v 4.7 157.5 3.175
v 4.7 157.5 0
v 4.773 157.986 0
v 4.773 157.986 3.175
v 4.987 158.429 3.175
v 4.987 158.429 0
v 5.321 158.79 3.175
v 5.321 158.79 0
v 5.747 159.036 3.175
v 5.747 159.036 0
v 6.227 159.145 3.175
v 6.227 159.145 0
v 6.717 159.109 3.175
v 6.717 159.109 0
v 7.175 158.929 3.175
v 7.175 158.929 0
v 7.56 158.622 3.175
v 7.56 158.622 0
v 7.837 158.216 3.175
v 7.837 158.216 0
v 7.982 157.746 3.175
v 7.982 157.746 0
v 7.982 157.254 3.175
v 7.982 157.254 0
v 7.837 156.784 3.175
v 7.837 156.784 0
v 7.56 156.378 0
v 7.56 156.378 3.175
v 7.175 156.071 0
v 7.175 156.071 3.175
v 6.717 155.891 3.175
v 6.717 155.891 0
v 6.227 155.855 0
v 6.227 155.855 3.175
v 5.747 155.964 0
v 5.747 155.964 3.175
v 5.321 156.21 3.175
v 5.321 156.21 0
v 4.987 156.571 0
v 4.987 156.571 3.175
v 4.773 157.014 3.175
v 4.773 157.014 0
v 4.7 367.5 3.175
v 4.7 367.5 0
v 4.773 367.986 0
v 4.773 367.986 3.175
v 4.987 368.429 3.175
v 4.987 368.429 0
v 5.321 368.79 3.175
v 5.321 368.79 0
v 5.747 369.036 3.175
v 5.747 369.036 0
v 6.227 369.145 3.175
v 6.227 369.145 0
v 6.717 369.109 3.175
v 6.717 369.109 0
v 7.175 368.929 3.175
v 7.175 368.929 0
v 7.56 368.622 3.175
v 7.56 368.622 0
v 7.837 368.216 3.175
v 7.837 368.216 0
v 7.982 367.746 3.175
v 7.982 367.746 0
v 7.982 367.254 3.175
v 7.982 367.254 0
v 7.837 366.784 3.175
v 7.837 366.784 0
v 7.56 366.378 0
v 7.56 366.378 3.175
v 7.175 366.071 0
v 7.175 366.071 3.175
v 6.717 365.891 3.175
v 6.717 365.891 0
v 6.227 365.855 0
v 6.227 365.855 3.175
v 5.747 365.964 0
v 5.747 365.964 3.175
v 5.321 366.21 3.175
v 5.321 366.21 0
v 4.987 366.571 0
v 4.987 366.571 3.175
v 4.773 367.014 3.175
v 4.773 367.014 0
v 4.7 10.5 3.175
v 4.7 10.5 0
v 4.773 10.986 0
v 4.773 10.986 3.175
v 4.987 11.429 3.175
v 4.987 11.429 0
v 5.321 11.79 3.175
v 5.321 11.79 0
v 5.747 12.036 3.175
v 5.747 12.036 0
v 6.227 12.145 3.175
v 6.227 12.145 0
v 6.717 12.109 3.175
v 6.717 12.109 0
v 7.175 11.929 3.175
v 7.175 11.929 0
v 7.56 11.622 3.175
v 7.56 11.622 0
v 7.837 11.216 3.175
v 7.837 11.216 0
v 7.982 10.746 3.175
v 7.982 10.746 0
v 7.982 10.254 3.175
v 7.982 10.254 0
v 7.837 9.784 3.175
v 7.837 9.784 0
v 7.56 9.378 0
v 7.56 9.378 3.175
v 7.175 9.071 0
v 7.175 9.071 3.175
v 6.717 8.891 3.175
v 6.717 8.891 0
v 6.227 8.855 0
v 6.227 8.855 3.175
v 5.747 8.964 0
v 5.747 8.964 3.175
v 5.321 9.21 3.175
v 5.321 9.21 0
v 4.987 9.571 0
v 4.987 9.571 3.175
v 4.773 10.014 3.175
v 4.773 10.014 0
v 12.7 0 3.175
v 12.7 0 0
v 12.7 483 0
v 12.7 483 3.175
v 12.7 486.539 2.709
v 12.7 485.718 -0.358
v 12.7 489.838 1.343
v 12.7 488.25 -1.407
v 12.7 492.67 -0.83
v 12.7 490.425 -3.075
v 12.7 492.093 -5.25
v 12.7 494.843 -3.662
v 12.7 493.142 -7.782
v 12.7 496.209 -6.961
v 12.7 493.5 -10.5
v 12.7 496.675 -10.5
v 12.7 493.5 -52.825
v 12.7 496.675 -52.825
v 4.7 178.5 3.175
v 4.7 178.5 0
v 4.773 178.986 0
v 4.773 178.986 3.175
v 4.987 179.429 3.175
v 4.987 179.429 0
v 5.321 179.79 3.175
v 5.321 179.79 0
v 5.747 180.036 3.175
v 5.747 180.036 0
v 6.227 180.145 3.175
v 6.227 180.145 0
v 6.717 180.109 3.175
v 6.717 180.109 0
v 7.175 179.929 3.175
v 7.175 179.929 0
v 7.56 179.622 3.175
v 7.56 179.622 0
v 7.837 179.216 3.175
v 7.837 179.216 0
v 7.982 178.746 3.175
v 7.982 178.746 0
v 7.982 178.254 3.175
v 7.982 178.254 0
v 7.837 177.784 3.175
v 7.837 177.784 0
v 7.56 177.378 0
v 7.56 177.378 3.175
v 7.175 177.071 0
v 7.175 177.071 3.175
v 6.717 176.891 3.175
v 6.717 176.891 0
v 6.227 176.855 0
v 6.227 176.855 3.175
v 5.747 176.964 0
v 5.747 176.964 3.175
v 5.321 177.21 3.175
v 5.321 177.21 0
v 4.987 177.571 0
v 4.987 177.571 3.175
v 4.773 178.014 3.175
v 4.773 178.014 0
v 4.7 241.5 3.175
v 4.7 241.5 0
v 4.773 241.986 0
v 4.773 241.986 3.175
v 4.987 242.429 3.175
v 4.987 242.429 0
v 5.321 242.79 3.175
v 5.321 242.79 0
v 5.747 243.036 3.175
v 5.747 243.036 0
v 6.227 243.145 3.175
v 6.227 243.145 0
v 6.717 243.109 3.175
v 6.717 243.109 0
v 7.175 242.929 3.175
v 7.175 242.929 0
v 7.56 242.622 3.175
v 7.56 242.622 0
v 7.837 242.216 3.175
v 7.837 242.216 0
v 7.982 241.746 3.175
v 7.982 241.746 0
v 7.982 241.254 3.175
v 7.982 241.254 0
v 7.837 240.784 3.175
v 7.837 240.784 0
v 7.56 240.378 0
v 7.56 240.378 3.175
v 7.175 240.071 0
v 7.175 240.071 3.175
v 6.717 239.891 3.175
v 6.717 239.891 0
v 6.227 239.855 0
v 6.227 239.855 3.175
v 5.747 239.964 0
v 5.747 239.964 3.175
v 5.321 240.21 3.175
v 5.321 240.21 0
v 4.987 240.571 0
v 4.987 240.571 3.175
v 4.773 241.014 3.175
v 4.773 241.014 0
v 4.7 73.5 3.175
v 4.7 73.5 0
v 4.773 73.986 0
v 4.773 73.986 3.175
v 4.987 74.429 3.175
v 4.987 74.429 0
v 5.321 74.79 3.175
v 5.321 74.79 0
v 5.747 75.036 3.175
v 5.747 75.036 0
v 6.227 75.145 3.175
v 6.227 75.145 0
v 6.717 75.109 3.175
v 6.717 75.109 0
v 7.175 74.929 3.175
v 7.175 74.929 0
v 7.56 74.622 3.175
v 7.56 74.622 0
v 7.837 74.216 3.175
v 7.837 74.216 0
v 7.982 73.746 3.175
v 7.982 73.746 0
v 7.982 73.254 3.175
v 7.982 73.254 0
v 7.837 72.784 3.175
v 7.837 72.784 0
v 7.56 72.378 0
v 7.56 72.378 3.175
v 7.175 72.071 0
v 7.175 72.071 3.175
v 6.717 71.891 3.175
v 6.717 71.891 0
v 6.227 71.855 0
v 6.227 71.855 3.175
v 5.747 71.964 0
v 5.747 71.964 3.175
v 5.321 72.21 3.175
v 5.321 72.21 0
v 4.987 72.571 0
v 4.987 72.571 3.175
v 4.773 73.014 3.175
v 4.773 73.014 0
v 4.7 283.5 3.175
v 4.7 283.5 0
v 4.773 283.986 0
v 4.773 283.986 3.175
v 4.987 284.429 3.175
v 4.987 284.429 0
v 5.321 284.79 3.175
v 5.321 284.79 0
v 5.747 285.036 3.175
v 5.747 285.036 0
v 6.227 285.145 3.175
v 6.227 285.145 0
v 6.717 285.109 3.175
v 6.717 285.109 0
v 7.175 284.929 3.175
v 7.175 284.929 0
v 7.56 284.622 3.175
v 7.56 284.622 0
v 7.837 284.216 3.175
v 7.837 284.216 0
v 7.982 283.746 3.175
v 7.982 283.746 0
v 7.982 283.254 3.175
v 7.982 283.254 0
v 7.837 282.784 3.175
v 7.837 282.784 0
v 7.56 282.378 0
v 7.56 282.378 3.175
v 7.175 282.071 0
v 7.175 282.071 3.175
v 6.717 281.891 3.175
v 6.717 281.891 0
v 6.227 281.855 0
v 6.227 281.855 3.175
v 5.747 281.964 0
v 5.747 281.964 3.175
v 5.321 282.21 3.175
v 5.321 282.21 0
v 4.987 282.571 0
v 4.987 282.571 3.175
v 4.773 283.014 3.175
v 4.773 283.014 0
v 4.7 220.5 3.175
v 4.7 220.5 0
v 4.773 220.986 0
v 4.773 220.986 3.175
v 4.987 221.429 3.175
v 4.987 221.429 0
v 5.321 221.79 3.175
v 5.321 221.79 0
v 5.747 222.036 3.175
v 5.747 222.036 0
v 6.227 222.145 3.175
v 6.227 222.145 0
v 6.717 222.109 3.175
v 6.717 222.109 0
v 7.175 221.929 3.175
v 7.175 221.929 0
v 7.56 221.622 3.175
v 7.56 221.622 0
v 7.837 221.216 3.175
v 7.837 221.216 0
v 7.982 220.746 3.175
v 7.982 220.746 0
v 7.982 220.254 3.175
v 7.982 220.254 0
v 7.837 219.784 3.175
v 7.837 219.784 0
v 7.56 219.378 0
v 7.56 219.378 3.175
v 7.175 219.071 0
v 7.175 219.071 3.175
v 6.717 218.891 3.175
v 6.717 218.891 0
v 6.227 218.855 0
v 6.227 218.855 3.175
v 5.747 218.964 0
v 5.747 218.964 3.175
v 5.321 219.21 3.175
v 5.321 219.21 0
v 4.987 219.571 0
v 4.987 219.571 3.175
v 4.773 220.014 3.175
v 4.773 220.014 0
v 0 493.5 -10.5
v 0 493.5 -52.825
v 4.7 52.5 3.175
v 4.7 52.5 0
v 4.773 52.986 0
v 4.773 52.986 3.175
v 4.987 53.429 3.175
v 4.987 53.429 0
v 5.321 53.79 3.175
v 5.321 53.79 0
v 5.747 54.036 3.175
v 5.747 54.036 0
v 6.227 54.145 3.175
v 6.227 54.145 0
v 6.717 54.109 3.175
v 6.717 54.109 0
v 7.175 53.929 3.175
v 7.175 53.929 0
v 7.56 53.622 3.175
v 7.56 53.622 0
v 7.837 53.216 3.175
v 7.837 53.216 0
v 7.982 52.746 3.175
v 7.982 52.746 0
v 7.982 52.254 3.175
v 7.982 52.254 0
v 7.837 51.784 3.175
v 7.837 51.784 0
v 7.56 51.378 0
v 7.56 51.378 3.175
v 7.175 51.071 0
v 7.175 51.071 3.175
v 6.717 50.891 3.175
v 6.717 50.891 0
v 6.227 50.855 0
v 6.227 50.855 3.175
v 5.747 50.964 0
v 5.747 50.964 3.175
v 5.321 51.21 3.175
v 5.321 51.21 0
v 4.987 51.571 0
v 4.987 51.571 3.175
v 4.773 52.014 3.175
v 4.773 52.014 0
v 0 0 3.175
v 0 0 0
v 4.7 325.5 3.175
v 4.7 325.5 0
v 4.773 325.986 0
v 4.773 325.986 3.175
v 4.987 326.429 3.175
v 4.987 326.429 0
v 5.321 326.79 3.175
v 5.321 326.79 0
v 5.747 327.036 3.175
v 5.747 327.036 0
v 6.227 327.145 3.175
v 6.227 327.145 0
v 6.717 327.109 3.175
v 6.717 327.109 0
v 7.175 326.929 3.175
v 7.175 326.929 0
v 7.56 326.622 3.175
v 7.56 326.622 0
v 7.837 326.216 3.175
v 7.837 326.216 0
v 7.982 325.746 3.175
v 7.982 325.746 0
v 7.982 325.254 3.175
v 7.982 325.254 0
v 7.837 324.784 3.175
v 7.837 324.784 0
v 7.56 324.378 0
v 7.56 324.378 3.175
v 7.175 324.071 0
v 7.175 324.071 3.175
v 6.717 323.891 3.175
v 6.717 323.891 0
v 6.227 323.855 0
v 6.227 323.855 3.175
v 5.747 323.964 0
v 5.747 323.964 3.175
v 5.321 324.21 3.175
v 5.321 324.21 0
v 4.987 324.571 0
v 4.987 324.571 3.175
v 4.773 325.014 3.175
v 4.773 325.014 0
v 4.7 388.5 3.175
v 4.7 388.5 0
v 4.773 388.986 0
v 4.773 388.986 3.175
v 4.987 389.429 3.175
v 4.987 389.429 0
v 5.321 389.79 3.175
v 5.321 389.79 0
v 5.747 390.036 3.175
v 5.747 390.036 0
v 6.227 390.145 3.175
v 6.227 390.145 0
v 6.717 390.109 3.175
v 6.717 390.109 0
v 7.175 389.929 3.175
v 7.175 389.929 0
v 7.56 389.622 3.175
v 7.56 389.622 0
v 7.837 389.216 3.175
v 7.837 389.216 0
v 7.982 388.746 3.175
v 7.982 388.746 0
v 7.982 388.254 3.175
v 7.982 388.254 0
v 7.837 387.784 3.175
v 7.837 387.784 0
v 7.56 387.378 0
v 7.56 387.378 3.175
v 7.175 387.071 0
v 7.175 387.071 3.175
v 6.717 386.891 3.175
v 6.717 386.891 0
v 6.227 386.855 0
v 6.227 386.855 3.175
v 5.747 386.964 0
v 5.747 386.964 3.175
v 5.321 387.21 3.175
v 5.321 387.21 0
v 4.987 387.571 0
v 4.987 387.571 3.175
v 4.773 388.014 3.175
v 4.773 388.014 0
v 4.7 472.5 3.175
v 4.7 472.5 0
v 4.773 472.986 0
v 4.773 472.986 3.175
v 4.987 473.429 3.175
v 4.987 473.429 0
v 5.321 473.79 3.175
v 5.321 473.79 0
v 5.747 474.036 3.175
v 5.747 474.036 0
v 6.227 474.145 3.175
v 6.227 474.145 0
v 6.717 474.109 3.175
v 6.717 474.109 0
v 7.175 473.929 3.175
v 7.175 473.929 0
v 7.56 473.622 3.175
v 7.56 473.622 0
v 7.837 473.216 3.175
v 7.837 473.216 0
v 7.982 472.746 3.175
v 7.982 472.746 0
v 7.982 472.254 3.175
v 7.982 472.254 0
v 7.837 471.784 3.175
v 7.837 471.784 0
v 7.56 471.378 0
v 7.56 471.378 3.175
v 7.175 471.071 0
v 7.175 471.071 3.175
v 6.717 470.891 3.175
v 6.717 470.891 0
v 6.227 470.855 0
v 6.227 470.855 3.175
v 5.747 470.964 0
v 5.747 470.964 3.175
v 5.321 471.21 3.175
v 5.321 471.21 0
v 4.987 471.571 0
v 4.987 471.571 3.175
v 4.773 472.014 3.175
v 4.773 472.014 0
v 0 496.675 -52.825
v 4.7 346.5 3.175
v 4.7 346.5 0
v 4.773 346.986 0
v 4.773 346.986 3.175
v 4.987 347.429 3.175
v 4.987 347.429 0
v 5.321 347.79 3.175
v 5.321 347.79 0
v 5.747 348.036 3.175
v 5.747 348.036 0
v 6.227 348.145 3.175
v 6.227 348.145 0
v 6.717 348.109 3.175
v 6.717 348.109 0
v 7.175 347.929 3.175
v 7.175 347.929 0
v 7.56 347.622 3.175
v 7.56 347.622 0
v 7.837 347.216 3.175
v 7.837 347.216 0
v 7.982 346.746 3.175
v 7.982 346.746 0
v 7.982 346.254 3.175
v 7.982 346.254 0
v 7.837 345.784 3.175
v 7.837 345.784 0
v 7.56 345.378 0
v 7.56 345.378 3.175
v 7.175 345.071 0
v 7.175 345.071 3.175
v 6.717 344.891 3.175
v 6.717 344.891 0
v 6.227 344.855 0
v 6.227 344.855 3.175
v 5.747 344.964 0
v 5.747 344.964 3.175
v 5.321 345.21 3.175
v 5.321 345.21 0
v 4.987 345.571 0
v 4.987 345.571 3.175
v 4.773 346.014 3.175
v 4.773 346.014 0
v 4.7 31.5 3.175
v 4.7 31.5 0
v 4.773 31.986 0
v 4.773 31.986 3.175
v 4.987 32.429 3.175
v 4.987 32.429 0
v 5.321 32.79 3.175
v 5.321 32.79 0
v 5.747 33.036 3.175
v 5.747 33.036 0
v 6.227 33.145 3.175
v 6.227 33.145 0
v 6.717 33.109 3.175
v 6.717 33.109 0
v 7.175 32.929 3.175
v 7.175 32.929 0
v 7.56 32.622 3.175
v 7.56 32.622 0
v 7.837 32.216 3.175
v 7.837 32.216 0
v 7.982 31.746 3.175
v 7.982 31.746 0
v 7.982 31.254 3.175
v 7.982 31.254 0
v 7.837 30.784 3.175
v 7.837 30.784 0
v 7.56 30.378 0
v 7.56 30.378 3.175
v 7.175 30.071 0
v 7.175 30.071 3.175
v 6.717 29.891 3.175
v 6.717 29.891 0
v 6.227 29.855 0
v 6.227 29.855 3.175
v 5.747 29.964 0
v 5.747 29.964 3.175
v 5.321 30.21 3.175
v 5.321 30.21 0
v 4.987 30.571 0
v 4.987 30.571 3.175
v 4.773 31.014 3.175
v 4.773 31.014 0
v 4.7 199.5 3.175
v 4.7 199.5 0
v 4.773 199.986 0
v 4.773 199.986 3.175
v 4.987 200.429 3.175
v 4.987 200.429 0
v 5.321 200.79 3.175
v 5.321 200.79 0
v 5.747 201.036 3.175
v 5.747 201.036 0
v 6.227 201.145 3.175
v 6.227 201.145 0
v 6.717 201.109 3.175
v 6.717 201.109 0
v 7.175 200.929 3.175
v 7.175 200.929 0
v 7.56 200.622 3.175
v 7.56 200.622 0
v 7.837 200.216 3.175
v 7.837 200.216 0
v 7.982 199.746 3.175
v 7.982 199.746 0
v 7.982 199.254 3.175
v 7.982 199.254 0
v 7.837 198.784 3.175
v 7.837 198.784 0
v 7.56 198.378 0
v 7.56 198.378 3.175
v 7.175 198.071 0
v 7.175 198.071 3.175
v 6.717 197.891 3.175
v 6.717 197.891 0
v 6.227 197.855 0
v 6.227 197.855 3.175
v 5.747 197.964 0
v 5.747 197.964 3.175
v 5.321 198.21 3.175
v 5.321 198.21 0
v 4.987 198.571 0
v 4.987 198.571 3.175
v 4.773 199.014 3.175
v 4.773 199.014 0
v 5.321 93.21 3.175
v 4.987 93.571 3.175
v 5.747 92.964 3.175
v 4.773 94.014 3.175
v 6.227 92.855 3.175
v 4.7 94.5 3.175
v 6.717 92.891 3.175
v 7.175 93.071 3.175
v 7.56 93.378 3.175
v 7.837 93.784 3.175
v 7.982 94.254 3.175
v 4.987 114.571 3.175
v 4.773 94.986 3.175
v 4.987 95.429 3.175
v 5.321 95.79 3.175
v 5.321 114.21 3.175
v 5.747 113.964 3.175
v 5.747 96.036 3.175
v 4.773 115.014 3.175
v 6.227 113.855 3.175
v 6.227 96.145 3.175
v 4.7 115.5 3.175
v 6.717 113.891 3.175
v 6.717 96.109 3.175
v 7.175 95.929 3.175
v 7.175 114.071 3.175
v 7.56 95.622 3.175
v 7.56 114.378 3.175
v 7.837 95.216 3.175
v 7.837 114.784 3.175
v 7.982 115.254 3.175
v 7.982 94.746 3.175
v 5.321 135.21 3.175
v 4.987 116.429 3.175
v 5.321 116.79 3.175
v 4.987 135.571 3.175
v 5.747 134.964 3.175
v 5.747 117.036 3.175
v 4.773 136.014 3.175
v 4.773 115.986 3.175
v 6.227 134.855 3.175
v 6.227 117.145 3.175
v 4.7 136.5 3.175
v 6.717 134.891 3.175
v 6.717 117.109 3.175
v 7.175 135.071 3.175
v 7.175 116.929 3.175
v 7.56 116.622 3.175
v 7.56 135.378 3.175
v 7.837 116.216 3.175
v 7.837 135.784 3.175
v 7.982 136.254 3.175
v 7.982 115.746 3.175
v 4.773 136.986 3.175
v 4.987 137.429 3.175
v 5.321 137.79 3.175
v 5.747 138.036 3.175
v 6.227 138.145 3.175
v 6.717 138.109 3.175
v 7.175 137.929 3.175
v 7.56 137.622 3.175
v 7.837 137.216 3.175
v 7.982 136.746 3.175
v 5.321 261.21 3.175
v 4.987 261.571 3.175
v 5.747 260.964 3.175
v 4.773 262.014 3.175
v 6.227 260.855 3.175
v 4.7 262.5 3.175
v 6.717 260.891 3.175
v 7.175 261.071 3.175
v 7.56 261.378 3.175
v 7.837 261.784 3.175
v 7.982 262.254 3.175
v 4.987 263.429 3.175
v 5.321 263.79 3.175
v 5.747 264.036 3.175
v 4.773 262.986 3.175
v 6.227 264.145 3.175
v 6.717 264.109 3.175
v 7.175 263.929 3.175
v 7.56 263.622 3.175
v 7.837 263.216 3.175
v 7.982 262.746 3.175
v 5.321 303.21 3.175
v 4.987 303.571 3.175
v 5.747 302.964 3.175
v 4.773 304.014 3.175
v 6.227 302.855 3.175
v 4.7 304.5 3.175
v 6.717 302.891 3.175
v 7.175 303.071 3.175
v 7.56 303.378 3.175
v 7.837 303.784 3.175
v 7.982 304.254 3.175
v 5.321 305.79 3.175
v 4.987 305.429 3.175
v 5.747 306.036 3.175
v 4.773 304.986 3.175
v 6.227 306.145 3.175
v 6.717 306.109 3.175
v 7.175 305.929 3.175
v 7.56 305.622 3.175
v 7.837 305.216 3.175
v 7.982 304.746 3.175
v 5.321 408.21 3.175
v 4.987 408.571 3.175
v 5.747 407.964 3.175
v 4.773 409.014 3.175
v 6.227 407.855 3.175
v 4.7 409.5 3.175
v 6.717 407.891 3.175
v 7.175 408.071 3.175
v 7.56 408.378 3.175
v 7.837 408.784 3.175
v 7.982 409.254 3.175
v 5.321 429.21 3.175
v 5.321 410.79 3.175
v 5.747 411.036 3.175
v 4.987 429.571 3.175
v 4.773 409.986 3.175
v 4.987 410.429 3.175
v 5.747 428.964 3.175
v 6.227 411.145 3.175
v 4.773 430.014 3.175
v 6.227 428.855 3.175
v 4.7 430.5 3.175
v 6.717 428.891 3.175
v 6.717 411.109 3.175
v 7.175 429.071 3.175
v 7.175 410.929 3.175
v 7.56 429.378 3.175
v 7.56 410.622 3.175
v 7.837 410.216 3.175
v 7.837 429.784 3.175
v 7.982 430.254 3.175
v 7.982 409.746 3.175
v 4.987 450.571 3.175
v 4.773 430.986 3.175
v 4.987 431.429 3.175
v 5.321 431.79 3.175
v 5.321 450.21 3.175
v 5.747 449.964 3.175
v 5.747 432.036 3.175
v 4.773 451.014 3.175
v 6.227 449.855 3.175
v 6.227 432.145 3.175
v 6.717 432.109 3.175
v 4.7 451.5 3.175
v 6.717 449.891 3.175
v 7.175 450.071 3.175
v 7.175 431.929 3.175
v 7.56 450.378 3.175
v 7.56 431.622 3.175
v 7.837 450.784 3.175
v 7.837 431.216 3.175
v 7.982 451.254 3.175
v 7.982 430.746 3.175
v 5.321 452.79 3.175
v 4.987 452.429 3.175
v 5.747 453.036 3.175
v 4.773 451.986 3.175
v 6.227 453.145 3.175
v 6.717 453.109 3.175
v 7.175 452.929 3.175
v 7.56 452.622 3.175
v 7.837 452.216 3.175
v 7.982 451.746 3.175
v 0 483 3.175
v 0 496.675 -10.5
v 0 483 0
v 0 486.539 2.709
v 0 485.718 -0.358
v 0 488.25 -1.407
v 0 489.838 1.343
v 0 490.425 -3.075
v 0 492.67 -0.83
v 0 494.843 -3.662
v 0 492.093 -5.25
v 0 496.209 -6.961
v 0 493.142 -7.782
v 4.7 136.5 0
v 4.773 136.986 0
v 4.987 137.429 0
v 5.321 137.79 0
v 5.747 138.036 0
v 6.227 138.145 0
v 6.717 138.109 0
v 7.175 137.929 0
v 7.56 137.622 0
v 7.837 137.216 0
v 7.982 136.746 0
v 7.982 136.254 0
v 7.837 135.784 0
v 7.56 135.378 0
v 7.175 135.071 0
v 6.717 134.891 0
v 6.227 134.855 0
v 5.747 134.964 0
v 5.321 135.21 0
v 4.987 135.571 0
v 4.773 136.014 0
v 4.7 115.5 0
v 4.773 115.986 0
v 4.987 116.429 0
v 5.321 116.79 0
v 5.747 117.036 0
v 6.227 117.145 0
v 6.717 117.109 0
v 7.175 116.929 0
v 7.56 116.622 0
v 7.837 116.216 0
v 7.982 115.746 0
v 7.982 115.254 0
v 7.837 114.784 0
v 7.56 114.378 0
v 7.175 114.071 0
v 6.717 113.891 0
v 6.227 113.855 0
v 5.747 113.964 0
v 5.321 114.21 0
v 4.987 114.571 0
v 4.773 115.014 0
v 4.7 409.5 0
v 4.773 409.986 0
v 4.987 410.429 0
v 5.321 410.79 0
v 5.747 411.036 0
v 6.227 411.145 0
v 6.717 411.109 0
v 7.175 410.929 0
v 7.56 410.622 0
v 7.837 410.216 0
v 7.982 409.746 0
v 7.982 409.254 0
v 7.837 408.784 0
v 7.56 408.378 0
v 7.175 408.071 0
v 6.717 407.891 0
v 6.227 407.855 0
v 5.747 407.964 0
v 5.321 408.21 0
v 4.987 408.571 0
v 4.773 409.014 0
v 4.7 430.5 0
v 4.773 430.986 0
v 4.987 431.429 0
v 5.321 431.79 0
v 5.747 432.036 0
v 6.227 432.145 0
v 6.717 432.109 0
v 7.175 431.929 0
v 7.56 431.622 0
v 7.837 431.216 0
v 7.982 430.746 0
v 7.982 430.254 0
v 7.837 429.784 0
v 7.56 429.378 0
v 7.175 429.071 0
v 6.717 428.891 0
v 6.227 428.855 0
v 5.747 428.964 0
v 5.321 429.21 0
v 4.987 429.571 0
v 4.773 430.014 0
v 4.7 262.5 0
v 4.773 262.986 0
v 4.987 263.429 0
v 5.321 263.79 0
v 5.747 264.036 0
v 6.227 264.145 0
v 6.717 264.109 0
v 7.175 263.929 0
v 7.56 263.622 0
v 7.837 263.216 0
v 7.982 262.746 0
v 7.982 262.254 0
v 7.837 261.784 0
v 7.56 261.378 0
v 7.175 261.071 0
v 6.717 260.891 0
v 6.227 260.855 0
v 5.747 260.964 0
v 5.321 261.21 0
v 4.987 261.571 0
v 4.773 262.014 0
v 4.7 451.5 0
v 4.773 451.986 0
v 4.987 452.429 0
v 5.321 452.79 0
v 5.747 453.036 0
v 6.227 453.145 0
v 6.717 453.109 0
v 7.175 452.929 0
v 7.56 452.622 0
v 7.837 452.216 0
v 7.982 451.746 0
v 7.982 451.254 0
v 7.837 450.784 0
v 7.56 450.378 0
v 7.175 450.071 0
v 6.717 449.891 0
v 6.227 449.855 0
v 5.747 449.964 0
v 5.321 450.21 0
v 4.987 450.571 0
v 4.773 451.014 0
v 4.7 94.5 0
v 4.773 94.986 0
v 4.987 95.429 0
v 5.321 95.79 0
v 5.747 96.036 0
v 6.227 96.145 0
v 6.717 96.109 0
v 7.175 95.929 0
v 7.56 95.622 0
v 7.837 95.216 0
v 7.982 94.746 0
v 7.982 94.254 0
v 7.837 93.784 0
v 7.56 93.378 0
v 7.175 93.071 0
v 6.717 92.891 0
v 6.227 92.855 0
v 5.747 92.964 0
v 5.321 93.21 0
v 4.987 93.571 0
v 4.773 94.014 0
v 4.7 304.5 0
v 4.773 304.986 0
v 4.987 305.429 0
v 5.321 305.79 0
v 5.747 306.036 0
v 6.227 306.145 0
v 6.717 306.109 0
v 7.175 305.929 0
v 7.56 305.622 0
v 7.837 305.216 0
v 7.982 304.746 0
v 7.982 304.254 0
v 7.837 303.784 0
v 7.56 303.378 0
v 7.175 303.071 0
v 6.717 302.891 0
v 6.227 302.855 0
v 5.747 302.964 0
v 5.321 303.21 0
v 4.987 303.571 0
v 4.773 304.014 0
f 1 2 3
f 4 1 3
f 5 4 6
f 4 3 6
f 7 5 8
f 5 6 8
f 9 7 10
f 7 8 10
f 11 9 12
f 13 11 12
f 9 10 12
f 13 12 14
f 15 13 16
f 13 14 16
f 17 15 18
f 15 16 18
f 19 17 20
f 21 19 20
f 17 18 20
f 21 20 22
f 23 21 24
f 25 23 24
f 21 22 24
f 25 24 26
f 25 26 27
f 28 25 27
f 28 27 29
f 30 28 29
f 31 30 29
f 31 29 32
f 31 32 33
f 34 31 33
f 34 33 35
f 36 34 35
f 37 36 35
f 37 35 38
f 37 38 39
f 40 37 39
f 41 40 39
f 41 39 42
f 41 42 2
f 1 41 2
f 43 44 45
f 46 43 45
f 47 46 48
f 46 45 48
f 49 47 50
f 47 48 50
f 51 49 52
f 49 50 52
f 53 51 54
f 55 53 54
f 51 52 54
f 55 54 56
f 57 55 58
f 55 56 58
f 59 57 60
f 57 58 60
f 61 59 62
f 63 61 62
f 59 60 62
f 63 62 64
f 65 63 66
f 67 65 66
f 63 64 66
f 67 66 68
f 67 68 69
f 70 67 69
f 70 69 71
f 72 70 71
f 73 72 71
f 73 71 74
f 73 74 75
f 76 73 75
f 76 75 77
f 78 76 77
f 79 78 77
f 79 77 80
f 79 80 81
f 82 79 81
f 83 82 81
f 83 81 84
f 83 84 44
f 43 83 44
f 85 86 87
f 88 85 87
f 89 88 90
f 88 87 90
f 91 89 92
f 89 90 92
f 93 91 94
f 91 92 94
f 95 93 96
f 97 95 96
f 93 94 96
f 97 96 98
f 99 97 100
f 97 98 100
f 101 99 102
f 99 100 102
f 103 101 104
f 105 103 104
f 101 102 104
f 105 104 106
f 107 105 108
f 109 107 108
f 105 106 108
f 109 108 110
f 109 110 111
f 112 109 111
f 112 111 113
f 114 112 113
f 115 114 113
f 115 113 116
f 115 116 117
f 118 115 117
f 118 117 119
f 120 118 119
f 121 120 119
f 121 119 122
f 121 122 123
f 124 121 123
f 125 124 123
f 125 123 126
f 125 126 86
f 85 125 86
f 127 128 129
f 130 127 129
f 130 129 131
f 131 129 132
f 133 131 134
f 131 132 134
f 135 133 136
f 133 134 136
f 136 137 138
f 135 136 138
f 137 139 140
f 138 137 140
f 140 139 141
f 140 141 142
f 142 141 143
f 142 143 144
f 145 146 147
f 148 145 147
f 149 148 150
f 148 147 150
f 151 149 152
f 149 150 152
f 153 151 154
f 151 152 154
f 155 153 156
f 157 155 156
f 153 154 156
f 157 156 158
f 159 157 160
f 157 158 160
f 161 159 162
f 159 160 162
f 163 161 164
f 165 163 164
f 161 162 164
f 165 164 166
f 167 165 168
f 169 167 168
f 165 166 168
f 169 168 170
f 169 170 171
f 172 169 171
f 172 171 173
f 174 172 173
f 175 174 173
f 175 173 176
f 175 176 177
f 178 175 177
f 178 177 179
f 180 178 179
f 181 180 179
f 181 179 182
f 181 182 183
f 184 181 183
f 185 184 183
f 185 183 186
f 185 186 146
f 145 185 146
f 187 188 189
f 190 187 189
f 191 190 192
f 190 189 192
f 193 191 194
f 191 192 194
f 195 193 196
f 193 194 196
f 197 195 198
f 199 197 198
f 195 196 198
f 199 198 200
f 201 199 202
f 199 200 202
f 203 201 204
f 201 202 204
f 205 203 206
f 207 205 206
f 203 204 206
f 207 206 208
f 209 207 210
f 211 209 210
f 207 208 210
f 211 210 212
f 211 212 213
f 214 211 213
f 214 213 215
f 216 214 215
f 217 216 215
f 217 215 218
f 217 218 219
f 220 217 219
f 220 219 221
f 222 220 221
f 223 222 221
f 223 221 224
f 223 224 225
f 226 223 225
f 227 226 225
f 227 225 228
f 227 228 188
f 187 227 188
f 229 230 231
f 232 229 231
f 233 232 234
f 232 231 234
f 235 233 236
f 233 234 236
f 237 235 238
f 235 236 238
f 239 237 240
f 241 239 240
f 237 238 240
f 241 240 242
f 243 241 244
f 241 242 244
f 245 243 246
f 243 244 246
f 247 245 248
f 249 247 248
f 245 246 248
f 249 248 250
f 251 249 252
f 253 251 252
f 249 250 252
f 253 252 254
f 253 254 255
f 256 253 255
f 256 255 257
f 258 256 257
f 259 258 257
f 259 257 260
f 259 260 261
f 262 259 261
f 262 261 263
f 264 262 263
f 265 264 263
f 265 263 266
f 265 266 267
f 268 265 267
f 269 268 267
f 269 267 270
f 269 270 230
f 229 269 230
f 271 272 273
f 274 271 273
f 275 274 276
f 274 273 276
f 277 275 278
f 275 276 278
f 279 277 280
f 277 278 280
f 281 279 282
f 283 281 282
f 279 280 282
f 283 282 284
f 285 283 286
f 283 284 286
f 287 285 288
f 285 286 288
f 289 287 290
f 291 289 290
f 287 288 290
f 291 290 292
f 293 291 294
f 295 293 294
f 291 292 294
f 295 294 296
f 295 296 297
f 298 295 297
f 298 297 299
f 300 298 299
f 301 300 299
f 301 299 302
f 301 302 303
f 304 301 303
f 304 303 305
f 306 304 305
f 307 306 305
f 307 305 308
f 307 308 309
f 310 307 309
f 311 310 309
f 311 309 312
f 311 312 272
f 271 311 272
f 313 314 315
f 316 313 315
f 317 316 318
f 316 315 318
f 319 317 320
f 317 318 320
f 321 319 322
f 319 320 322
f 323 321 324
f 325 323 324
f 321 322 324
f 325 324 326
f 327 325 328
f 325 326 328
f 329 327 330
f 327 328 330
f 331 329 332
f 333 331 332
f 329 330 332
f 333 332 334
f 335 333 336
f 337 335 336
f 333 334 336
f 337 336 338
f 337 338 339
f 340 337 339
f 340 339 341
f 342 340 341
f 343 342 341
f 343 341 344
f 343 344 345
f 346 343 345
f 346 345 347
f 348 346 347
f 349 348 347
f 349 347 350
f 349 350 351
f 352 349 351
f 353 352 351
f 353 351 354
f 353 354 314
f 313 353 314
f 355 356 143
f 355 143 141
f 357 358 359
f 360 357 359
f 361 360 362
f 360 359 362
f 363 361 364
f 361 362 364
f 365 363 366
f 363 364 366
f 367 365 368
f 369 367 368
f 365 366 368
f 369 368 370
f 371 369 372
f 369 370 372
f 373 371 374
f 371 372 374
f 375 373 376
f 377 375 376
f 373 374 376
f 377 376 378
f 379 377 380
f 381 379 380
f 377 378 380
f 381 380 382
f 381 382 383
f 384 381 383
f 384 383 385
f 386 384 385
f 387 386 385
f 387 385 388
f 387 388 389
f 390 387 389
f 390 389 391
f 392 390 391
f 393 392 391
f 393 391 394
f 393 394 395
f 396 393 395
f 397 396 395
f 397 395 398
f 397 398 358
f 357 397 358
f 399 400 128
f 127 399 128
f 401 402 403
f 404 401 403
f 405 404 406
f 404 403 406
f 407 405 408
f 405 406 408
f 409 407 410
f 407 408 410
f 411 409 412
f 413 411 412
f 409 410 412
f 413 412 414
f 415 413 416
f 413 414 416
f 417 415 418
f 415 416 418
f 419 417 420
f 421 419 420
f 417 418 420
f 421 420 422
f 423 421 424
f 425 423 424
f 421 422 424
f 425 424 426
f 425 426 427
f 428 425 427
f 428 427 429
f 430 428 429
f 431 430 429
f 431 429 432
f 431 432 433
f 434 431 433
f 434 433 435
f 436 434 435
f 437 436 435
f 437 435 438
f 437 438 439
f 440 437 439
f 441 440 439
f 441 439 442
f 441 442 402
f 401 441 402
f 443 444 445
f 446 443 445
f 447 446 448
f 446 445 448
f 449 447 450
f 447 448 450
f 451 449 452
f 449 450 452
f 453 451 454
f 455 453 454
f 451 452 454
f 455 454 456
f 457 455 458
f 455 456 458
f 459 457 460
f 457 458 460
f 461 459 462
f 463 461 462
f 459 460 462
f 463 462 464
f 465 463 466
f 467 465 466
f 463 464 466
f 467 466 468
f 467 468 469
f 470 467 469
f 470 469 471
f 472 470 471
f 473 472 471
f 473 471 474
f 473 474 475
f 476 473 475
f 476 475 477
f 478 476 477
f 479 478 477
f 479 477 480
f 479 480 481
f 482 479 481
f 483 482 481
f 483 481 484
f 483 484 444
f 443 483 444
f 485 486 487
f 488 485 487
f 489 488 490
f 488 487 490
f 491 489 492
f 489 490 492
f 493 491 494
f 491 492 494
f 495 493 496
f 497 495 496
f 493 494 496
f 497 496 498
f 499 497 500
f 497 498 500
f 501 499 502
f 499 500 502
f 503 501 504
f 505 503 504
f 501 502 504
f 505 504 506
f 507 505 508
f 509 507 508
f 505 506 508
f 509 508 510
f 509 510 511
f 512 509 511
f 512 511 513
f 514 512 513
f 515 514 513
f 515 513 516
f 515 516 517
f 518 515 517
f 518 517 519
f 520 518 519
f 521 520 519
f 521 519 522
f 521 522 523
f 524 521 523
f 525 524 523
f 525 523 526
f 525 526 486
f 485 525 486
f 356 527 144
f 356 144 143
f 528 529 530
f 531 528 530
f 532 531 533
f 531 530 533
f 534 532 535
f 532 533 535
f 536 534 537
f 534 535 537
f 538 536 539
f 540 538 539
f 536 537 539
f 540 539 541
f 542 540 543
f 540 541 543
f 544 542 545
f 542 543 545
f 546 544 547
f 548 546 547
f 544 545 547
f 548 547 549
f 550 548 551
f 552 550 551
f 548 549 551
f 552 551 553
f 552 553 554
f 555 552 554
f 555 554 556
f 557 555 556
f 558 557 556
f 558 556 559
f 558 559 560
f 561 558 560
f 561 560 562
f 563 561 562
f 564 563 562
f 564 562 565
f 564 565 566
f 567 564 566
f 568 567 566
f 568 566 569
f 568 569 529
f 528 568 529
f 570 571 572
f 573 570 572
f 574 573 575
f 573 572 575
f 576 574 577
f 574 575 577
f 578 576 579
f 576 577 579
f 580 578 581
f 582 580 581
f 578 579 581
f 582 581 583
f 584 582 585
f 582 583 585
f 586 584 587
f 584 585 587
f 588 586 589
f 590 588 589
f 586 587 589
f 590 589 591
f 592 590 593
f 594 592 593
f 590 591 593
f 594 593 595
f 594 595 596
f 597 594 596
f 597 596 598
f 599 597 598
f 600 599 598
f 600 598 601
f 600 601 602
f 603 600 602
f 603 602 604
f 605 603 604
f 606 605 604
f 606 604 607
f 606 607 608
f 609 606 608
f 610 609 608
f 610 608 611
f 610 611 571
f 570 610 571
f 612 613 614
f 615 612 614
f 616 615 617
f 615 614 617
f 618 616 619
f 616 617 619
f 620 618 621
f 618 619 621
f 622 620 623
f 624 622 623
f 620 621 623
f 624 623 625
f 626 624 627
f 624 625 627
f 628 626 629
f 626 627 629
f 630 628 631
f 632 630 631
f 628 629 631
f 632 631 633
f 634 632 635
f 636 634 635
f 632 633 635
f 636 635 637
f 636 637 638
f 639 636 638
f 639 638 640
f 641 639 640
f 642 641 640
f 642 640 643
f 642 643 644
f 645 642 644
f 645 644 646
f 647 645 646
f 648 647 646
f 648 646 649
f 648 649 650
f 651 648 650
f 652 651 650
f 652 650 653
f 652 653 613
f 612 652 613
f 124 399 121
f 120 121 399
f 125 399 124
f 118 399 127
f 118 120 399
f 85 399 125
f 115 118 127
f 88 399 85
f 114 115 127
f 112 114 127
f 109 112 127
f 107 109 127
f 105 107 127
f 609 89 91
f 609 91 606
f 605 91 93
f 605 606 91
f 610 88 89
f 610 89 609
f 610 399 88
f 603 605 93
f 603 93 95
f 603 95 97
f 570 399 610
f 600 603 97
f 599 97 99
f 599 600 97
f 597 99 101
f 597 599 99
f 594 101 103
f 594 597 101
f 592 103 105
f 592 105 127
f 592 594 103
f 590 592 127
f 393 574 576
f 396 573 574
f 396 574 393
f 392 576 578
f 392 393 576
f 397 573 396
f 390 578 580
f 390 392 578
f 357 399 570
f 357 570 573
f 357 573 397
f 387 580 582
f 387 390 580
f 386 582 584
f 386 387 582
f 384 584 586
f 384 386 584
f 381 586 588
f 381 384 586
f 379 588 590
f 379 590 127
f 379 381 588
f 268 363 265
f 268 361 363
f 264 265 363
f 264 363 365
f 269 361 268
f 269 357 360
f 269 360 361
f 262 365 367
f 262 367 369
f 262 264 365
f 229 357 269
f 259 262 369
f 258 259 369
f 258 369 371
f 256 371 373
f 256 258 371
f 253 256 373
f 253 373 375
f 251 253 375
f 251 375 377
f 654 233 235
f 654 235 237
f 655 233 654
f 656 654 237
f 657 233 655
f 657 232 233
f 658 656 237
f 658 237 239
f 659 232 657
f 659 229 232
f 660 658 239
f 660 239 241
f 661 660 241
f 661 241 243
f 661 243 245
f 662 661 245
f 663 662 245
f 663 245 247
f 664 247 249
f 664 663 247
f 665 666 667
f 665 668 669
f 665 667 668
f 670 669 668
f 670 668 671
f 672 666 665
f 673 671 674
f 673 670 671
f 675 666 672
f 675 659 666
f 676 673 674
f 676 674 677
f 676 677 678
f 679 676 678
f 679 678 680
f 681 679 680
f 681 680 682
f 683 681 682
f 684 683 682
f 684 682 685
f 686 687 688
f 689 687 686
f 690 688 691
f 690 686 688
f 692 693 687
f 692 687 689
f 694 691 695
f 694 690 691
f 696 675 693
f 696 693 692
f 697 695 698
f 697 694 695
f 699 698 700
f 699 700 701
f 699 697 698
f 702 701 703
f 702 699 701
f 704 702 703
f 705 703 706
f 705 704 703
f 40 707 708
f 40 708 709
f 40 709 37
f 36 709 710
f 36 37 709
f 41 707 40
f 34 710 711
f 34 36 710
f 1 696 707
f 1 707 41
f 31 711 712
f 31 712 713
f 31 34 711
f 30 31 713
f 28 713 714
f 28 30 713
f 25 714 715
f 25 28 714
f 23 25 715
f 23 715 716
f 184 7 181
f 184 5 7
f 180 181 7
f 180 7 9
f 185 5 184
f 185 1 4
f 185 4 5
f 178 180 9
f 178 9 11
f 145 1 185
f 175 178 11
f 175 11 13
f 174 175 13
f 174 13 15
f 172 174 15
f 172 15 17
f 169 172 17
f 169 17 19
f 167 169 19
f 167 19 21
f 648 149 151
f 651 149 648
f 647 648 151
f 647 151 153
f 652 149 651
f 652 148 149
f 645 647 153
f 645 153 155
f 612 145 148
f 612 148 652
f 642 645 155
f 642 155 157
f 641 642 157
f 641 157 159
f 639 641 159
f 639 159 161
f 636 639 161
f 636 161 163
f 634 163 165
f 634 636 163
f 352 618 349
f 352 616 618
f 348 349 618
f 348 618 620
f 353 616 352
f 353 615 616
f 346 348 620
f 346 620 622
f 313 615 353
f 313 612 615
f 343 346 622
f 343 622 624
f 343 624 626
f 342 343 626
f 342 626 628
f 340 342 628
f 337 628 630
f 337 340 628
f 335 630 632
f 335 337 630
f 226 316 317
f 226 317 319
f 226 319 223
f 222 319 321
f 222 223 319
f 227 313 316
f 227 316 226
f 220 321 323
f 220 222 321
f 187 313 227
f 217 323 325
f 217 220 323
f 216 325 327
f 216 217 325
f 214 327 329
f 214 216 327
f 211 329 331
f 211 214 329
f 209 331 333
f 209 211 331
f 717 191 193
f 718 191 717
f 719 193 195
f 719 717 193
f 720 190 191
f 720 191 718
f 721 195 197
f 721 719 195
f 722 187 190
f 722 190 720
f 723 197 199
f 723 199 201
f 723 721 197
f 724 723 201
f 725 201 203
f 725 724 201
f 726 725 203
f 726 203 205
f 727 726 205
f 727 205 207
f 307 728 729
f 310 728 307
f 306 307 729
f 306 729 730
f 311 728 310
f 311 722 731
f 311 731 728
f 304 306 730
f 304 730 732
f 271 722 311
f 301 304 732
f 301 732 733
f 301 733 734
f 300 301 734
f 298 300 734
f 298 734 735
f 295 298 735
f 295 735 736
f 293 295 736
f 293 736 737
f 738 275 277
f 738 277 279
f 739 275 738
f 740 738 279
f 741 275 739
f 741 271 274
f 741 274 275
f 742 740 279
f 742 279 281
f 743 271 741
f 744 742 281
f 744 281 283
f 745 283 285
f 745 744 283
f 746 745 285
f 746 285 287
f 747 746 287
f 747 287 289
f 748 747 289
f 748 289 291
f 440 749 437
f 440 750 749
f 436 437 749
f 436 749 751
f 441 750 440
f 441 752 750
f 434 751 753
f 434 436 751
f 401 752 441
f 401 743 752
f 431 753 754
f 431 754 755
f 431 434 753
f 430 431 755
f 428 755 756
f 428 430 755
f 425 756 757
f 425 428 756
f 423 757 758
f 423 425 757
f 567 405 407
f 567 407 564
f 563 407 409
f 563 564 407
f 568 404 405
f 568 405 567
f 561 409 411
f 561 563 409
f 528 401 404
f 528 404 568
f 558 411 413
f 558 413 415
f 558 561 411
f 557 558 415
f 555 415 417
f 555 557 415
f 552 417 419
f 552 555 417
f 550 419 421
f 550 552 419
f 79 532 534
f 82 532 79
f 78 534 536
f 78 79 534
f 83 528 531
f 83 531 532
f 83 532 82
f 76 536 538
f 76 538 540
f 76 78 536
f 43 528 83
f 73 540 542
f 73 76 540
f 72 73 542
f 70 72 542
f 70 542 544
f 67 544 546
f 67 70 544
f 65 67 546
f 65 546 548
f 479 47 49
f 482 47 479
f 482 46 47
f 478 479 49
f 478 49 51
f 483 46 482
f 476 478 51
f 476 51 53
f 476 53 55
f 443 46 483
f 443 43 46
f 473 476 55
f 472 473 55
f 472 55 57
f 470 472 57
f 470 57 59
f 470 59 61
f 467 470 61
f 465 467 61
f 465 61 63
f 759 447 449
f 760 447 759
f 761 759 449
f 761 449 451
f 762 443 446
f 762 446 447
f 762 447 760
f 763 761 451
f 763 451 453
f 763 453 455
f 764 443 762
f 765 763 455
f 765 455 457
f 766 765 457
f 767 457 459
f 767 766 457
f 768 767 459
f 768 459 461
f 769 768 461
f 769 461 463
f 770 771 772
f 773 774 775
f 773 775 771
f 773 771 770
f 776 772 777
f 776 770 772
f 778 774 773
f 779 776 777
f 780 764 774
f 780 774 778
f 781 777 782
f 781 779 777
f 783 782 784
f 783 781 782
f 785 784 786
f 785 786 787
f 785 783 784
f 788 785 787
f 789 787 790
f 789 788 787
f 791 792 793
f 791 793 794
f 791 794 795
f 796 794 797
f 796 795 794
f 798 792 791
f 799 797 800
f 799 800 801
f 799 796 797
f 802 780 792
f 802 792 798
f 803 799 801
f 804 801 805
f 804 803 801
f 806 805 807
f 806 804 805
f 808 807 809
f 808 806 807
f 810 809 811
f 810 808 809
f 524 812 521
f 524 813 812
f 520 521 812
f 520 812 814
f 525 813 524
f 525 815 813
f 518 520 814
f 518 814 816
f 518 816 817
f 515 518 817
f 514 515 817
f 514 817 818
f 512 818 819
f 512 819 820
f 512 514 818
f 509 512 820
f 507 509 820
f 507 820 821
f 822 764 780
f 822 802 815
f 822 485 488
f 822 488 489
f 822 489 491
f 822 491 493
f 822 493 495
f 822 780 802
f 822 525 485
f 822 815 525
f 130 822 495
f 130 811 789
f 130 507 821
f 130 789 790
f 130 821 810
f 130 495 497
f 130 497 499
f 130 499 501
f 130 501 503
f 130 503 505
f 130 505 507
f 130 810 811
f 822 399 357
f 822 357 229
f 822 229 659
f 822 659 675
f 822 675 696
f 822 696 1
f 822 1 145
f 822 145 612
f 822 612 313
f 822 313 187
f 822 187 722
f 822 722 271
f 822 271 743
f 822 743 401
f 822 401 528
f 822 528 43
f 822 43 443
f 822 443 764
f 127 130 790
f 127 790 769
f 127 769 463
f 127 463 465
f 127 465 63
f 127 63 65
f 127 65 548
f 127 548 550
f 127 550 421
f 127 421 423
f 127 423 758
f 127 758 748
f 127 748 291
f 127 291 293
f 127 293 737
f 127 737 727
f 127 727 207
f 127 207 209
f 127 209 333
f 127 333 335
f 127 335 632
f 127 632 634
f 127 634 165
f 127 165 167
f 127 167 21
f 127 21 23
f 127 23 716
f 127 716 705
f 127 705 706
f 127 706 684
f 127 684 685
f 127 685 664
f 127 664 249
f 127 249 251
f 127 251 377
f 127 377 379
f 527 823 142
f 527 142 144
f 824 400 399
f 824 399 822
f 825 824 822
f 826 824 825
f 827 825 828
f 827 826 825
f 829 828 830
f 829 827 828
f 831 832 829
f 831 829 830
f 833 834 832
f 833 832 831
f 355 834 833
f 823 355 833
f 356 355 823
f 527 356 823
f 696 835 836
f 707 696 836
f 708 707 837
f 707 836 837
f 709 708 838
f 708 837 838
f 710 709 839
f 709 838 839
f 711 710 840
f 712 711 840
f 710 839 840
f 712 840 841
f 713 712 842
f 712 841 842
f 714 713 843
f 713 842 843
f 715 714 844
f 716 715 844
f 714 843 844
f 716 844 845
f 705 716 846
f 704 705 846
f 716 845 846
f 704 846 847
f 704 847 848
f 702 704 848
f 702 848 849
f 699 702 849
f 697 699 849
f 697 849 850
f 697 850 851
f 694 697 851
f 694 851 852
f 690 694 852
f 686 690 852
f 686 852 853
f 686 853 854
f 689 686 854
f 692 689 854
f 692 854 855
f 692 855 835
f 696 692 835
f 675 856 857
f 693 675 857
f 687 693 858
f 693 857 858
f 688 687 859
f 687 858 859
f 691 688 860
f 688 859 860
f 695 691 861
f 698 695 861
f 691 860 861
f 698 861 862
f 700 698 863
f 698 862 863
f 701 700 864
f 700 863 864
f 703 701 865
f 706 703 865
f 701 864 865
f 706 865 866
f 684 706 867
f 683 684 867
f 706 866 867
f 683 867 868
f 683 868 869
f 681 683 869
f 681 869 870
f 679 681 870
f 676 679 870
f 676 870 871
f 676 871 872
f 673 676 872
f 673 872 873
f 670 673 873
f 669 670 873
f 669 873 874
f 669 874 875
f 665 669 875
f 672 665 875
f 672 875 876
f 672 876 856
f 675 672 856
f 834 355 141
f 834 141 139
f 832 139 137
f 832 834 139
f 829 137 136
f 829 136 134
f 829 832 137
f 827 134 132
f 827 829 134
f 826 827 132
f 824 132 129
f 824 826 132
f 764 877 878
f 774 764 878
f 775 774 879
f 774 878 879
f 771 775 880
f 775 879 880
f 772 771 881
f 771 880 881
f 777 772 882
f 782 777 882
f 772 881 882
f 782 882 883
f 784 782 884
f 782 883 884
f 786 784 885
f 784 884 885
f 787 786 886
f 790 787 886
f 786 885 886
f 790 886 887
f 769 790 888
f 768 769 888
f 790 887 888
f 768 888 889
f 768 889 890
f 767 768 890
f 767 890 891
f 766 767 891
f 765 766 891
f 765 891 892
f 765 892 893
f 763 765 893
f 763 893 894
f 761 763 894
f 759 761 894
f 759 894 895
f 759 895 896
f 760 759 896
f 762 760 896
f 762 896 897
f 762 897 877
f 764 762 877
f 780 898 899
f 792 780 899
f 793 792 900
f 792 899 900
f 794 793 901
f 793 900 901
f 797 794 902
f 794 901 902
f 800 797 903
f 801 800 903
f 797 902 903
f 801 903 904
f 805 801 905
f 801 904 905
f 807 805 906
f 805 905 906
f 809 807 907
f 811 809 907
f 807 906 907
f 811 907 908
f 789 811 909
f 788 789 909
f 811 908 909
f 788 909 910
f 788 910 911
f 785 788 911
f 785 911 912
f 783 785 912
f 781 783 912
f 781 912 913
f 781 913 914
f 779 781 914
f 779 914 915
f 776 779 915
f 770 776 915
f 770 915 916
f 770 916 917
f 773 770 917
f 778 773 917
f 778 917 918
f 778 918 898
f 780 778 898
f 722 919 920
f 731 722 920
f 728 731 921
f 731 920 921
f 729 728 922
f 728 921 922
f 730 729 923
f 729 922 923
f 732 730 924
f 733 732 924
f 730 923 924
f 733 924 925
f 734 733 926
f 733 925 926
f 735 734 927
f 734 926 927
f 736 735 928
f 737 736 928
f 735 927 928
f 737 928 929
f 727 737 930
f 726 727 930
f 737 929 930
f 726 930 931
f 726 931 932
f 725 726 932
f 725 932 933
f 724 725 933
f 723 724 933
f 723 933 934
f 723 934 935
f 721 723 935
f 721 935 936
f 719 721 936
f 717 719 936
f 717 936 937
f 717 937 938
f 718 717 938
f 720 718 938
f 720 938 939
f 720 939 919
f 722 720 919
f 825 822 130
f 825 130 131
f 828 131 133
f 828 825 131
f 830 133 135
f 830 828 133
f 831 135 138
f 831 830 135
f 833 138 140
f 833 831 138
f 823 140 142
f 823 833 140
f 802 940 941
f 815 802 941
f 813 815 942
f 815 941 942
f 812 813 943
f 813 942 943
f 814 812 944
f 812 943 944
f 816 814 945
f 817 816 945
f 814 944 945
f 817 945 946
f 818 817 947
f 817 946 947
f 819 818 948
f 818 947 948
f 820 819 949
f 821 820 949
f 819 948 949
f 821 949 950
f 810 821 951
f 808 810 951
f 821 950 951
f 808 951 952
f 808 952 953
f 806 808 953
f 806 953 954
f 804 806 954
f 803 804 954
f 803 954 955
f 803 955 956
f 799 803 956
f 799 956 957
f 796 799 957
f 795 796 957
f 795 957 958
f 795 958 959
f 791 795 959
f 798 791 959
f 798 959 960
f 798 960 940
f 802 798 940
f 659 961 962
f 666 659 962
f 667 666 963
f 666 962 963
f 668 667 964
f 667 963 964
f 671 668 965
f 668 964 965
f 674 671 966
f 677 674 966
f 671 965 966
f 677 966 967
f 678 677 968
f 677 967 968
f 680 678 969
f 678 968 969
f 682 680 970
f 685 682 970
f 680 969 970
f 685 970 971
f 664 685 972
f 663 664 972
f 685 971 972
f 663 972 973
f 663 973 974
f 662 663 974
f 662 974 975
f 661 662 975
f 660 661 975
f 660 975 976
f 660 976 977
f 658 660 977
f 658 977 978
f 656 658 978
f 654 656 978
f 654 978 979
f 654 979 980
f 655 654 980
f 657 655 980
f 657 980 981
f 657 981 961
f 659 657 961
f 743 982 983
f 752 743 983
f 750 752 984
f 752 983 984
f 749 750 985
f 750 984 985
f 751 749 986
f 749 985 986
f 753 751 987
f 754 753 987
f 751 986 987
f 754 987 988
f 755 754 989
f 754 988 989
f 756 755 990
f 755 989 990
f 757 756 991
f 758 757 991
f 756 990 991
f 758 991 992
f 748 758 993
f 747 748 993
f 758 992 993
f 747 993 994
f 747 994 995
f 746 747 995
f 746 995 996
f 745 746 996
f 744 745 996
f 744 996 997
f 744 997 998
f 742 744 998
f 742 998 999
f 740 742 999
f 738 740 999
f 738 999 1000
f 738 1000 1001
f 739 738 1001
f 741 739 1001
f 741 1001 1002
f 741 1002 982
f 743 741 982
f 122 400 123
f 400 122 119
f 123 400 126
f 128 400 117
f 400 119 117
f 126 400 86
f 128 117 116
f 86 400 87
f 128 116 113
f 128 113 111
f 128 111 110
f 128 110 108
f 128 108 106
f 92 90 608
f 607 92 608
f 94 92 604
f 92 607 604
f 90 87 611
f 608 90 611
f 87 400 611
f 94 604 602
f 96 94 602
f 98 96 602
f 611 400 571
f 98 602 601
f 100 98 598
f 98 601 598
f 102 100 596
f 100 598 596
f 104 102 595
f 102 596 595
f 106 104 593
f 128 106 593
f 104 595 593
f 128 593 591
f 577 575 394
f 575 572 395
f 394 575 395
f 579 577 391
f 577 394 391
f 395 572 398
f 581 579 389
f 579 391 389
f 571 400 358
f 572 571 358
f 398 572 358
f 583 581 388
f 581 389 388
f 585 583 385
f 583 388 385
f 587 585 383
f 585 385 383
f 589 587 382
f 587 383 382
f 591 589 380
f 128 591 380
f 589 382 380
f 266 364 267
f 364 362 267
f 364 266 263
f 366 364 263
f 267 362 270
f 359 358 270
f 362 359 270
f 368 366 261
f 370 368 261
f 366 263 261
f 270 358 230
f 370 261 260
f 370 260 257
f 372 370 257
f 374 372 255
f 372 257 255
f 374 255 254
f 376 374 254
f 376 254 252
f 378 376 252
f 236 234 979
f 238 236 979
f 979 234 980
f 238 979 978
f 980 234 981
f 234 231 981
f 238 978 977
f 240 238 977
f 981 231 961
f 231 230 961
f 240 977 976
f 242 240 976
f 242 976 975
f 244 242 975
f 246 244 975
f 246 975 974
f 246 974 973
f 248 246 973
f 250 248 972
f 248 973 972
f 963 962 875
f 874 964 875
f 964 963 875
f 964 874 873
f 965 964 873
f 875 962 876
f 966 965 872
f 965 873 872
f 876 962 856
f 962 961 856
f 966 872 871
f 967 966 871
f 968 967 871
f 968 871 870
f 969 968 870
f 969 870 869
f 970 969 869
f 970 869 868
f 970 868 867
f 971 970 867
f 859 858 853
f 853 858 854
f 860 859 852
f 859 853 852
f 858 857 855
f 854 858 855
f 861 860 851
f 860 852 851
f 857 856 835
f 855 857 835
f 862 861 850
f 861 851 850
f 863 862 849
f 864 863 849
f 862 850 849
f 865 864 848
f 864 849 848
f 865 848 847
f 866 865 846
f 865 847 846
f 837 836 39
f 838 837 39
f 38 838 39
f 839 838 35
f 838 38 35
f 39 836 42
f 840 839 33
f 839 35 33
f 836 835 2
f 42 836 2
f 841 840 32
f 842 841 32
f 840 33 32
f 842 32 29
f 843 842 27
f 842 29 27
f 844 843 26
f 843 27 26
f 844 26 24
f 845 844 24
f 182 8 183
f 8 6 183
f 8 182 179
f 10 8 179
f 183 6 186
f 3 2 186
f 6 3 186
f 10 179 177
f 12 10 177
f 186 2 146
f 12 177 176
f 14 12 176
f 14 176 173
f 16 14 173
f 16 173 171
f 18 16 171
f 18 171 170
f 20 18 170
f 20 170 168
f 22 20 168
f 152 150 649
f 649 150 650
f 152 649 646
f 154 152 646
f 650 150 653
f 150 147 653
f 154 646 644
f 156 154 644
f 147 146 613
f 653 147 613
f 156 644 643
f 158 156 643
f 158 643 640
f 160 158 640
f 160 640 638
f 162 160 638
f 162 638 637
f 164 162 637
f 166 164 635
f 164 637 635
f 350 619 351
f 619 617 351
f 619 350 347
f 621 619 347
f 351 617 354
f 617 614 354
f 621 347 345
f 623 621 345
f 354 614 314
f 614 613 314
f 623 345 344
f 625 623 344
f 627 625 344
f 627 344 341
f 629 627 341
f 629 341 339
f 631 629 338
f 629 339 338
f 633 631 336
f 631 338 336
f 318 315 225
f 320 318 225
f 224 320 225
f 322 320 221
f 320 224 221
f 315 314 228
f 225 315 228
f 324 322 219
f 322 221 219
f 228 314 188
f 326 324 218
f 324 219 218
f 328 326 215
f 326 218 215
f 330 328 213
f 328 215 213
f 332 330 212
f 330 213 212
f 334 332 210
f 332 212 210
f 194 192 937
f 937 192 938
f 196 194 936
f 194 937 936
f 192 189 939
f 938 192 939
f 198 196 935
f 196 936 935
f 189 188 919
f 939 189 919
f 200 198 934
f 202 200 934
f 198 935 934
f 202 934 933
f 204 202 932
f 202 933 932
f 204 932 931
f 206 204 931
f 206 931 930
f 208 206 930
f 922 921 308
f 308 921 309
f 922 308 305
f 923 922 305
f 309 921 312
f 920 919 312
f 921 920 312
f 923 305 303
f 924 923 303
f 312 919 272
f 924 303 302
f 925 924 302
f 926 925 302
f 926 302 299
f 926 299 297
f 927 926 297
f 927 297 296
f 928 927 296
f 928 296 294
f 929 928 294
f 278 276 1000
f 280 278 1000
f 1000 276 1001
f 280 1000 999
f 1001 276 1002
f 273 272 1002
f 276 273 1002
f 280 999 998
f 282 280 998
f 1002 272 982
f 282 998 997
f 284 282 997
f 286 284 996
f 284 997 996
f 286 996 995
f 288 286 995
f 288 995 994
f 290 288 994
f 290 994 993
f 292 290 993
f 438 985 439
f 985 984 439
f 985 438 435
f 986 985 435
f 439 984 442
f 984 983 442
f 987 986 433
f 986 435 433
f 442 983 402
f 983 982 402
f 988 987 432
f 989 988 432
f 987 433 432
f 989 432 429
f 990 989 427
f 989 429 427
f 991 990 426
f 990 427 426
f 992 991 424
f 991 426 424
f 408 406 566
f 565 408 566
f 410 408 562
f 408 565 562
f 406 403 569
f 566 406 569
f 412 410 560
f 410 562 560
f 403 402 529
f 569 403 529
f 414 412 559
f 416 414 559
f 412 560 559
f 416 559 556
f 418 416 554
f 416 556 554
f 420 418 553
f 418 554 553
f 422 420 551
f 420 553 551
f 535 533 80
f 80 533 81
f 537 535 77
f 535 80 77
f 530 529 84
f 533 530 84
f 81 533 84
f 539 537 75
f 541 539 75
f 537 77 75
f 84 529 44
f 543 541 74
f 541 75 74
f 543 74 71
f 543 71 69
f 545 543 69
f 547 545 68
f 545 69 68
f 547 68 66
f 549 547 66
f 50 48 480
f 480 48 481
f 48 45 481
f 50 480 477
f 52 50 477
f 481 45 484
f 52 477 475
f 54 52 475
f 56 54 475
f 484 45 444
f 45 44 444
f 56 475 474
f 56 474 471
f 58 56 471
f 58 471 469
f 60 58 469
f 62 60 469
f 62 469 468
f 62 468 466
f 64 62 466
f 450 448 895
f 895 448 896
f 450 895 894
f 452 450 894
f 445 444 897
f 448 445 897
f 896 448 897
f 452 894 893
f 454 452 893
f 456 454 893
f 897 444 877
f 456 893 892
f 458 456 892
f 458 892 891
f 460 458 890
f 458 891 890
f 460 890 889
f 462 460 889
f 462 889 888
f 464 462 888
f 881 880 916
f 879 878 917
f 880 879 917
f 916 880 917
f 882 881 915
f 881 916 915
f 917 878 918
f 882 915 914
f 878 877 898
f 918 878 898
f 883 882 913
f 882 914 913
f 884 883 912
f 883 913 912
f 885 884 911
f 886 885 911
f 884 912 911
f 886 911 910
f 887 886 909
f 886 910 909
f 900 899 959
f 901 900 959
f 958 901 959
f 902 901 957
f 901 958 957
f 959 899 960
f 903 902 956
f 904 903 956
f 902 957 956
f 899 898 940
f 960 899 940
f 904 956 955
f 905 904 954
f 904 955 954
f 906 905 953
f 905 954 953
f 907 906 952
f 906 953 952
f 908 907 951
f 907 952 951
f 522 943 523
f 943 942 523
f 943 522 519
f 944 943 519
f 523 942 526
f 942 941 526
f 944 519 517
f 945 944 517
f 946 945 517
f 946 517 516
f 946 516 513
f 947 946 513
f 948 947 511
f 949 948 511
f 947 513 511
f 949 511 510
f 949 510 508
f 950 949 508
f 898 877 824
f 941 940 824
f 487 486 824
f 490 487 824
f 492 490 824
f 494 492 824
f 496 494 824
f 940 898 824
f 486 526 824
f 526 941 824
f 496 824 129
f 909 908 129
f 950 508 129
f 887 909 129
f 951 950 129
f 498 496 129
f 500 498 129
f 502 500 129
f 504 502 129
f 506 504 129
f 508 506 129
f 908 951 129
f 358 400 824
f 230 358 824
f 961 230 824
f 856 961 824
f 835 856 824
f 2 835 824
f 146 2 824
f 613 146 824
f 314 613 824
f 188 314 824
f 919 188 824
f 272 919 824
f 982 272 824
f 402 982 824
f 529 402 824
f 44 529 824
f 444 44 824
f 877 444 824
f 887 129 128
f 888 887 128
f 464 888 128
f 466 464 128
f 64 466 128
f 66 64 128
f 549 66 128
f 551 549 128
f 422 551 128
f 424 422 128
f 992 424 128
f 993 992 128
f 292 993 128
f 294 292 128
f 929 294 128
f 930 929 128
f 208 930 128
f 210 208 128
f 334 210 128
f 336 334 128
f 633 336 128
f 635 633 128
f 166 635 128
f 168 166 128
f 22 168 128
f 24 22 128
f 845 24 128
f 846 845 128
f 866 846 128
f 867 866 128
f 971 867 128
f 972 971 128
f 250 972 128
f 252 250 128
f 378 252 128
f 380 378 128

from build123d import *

# Parameters (mm, degrees)
SKETCH1_W                   = 12.7
SKETCH1_H                   = 483
BOSS_EXTRUDE1_DEPTH         = 3.175
EDGE_FLANGE1_DEPTH          = 12.7
TAP_DRILL_FOR_M4X0_7_TAP1_D = 3.3


# Sheet-metal steps are written as plain solids
with BuildPart() as part:
    # Sketch1 → Boss-Extrude1 (new body)
    with BuildSketch(Plane.XY):
        with Locations((6.35, 241.5)):
            Rectangle(SKETCH1_W, SKETCH1_H)
    extrude(amount=BOSS_EXTRUDE1_DEPTH)

    # Edge-Flange1 section (across the edge) → Edge-Flange1 (add)
    with BuildSketch(Plane(origin=(0, 493.5, 0), x_dir=(0, -1, 0), z_dir=(1, 0, 0))):
        with BuildLine():
            Line((-3.175, 10.5), (-3.175, 52.825))
            Line((-3.175, 52.825), (0, 52.825))
            Line((0, 52.825), (0, 10.5))
            ThreePointArc((0, 10.5), (3.075378798, 3.075378798), (10.5, 0))
            Line((10.5, 0), (10.5, -3.175))
            ThreePointArc((10.5, -3.175), (0.830314767, 0.830314767), (-3.175, 10.5))
        make_face()
    extrude(amount=EDGE_FLANGE1_DEPTH)

    # Tap Drill for M4x0.7 Tap1 (through all)
    with Locations(Plane.XY.offset(3.175)):
        with Locations((6.35, 10.5), (6.35, 31.5), (6.35, 52.5), (6.35, 73.5), (6.35, 94.5), (6.35, 115.5), (6.35, 136.5), (6.35, 157.5), (6.35, 178.5), (6.35, 199.5), (6.35, 220.5), (6.35, 241.5), (6.35, 262.5), (6.35, 283.5), (6.35, 304.5), (6.35, 325.5), (6.35, 346.5), (6.35, 367.5), (6.35, 388.5), (6.35, 409.5), (6.35, 430.5), (6.35, 451.5), (6.35, 472.5)):
            Hole(TAP_DRILL_FOR_M4X0_7_TAP1_D / 2)


solid = part.part
